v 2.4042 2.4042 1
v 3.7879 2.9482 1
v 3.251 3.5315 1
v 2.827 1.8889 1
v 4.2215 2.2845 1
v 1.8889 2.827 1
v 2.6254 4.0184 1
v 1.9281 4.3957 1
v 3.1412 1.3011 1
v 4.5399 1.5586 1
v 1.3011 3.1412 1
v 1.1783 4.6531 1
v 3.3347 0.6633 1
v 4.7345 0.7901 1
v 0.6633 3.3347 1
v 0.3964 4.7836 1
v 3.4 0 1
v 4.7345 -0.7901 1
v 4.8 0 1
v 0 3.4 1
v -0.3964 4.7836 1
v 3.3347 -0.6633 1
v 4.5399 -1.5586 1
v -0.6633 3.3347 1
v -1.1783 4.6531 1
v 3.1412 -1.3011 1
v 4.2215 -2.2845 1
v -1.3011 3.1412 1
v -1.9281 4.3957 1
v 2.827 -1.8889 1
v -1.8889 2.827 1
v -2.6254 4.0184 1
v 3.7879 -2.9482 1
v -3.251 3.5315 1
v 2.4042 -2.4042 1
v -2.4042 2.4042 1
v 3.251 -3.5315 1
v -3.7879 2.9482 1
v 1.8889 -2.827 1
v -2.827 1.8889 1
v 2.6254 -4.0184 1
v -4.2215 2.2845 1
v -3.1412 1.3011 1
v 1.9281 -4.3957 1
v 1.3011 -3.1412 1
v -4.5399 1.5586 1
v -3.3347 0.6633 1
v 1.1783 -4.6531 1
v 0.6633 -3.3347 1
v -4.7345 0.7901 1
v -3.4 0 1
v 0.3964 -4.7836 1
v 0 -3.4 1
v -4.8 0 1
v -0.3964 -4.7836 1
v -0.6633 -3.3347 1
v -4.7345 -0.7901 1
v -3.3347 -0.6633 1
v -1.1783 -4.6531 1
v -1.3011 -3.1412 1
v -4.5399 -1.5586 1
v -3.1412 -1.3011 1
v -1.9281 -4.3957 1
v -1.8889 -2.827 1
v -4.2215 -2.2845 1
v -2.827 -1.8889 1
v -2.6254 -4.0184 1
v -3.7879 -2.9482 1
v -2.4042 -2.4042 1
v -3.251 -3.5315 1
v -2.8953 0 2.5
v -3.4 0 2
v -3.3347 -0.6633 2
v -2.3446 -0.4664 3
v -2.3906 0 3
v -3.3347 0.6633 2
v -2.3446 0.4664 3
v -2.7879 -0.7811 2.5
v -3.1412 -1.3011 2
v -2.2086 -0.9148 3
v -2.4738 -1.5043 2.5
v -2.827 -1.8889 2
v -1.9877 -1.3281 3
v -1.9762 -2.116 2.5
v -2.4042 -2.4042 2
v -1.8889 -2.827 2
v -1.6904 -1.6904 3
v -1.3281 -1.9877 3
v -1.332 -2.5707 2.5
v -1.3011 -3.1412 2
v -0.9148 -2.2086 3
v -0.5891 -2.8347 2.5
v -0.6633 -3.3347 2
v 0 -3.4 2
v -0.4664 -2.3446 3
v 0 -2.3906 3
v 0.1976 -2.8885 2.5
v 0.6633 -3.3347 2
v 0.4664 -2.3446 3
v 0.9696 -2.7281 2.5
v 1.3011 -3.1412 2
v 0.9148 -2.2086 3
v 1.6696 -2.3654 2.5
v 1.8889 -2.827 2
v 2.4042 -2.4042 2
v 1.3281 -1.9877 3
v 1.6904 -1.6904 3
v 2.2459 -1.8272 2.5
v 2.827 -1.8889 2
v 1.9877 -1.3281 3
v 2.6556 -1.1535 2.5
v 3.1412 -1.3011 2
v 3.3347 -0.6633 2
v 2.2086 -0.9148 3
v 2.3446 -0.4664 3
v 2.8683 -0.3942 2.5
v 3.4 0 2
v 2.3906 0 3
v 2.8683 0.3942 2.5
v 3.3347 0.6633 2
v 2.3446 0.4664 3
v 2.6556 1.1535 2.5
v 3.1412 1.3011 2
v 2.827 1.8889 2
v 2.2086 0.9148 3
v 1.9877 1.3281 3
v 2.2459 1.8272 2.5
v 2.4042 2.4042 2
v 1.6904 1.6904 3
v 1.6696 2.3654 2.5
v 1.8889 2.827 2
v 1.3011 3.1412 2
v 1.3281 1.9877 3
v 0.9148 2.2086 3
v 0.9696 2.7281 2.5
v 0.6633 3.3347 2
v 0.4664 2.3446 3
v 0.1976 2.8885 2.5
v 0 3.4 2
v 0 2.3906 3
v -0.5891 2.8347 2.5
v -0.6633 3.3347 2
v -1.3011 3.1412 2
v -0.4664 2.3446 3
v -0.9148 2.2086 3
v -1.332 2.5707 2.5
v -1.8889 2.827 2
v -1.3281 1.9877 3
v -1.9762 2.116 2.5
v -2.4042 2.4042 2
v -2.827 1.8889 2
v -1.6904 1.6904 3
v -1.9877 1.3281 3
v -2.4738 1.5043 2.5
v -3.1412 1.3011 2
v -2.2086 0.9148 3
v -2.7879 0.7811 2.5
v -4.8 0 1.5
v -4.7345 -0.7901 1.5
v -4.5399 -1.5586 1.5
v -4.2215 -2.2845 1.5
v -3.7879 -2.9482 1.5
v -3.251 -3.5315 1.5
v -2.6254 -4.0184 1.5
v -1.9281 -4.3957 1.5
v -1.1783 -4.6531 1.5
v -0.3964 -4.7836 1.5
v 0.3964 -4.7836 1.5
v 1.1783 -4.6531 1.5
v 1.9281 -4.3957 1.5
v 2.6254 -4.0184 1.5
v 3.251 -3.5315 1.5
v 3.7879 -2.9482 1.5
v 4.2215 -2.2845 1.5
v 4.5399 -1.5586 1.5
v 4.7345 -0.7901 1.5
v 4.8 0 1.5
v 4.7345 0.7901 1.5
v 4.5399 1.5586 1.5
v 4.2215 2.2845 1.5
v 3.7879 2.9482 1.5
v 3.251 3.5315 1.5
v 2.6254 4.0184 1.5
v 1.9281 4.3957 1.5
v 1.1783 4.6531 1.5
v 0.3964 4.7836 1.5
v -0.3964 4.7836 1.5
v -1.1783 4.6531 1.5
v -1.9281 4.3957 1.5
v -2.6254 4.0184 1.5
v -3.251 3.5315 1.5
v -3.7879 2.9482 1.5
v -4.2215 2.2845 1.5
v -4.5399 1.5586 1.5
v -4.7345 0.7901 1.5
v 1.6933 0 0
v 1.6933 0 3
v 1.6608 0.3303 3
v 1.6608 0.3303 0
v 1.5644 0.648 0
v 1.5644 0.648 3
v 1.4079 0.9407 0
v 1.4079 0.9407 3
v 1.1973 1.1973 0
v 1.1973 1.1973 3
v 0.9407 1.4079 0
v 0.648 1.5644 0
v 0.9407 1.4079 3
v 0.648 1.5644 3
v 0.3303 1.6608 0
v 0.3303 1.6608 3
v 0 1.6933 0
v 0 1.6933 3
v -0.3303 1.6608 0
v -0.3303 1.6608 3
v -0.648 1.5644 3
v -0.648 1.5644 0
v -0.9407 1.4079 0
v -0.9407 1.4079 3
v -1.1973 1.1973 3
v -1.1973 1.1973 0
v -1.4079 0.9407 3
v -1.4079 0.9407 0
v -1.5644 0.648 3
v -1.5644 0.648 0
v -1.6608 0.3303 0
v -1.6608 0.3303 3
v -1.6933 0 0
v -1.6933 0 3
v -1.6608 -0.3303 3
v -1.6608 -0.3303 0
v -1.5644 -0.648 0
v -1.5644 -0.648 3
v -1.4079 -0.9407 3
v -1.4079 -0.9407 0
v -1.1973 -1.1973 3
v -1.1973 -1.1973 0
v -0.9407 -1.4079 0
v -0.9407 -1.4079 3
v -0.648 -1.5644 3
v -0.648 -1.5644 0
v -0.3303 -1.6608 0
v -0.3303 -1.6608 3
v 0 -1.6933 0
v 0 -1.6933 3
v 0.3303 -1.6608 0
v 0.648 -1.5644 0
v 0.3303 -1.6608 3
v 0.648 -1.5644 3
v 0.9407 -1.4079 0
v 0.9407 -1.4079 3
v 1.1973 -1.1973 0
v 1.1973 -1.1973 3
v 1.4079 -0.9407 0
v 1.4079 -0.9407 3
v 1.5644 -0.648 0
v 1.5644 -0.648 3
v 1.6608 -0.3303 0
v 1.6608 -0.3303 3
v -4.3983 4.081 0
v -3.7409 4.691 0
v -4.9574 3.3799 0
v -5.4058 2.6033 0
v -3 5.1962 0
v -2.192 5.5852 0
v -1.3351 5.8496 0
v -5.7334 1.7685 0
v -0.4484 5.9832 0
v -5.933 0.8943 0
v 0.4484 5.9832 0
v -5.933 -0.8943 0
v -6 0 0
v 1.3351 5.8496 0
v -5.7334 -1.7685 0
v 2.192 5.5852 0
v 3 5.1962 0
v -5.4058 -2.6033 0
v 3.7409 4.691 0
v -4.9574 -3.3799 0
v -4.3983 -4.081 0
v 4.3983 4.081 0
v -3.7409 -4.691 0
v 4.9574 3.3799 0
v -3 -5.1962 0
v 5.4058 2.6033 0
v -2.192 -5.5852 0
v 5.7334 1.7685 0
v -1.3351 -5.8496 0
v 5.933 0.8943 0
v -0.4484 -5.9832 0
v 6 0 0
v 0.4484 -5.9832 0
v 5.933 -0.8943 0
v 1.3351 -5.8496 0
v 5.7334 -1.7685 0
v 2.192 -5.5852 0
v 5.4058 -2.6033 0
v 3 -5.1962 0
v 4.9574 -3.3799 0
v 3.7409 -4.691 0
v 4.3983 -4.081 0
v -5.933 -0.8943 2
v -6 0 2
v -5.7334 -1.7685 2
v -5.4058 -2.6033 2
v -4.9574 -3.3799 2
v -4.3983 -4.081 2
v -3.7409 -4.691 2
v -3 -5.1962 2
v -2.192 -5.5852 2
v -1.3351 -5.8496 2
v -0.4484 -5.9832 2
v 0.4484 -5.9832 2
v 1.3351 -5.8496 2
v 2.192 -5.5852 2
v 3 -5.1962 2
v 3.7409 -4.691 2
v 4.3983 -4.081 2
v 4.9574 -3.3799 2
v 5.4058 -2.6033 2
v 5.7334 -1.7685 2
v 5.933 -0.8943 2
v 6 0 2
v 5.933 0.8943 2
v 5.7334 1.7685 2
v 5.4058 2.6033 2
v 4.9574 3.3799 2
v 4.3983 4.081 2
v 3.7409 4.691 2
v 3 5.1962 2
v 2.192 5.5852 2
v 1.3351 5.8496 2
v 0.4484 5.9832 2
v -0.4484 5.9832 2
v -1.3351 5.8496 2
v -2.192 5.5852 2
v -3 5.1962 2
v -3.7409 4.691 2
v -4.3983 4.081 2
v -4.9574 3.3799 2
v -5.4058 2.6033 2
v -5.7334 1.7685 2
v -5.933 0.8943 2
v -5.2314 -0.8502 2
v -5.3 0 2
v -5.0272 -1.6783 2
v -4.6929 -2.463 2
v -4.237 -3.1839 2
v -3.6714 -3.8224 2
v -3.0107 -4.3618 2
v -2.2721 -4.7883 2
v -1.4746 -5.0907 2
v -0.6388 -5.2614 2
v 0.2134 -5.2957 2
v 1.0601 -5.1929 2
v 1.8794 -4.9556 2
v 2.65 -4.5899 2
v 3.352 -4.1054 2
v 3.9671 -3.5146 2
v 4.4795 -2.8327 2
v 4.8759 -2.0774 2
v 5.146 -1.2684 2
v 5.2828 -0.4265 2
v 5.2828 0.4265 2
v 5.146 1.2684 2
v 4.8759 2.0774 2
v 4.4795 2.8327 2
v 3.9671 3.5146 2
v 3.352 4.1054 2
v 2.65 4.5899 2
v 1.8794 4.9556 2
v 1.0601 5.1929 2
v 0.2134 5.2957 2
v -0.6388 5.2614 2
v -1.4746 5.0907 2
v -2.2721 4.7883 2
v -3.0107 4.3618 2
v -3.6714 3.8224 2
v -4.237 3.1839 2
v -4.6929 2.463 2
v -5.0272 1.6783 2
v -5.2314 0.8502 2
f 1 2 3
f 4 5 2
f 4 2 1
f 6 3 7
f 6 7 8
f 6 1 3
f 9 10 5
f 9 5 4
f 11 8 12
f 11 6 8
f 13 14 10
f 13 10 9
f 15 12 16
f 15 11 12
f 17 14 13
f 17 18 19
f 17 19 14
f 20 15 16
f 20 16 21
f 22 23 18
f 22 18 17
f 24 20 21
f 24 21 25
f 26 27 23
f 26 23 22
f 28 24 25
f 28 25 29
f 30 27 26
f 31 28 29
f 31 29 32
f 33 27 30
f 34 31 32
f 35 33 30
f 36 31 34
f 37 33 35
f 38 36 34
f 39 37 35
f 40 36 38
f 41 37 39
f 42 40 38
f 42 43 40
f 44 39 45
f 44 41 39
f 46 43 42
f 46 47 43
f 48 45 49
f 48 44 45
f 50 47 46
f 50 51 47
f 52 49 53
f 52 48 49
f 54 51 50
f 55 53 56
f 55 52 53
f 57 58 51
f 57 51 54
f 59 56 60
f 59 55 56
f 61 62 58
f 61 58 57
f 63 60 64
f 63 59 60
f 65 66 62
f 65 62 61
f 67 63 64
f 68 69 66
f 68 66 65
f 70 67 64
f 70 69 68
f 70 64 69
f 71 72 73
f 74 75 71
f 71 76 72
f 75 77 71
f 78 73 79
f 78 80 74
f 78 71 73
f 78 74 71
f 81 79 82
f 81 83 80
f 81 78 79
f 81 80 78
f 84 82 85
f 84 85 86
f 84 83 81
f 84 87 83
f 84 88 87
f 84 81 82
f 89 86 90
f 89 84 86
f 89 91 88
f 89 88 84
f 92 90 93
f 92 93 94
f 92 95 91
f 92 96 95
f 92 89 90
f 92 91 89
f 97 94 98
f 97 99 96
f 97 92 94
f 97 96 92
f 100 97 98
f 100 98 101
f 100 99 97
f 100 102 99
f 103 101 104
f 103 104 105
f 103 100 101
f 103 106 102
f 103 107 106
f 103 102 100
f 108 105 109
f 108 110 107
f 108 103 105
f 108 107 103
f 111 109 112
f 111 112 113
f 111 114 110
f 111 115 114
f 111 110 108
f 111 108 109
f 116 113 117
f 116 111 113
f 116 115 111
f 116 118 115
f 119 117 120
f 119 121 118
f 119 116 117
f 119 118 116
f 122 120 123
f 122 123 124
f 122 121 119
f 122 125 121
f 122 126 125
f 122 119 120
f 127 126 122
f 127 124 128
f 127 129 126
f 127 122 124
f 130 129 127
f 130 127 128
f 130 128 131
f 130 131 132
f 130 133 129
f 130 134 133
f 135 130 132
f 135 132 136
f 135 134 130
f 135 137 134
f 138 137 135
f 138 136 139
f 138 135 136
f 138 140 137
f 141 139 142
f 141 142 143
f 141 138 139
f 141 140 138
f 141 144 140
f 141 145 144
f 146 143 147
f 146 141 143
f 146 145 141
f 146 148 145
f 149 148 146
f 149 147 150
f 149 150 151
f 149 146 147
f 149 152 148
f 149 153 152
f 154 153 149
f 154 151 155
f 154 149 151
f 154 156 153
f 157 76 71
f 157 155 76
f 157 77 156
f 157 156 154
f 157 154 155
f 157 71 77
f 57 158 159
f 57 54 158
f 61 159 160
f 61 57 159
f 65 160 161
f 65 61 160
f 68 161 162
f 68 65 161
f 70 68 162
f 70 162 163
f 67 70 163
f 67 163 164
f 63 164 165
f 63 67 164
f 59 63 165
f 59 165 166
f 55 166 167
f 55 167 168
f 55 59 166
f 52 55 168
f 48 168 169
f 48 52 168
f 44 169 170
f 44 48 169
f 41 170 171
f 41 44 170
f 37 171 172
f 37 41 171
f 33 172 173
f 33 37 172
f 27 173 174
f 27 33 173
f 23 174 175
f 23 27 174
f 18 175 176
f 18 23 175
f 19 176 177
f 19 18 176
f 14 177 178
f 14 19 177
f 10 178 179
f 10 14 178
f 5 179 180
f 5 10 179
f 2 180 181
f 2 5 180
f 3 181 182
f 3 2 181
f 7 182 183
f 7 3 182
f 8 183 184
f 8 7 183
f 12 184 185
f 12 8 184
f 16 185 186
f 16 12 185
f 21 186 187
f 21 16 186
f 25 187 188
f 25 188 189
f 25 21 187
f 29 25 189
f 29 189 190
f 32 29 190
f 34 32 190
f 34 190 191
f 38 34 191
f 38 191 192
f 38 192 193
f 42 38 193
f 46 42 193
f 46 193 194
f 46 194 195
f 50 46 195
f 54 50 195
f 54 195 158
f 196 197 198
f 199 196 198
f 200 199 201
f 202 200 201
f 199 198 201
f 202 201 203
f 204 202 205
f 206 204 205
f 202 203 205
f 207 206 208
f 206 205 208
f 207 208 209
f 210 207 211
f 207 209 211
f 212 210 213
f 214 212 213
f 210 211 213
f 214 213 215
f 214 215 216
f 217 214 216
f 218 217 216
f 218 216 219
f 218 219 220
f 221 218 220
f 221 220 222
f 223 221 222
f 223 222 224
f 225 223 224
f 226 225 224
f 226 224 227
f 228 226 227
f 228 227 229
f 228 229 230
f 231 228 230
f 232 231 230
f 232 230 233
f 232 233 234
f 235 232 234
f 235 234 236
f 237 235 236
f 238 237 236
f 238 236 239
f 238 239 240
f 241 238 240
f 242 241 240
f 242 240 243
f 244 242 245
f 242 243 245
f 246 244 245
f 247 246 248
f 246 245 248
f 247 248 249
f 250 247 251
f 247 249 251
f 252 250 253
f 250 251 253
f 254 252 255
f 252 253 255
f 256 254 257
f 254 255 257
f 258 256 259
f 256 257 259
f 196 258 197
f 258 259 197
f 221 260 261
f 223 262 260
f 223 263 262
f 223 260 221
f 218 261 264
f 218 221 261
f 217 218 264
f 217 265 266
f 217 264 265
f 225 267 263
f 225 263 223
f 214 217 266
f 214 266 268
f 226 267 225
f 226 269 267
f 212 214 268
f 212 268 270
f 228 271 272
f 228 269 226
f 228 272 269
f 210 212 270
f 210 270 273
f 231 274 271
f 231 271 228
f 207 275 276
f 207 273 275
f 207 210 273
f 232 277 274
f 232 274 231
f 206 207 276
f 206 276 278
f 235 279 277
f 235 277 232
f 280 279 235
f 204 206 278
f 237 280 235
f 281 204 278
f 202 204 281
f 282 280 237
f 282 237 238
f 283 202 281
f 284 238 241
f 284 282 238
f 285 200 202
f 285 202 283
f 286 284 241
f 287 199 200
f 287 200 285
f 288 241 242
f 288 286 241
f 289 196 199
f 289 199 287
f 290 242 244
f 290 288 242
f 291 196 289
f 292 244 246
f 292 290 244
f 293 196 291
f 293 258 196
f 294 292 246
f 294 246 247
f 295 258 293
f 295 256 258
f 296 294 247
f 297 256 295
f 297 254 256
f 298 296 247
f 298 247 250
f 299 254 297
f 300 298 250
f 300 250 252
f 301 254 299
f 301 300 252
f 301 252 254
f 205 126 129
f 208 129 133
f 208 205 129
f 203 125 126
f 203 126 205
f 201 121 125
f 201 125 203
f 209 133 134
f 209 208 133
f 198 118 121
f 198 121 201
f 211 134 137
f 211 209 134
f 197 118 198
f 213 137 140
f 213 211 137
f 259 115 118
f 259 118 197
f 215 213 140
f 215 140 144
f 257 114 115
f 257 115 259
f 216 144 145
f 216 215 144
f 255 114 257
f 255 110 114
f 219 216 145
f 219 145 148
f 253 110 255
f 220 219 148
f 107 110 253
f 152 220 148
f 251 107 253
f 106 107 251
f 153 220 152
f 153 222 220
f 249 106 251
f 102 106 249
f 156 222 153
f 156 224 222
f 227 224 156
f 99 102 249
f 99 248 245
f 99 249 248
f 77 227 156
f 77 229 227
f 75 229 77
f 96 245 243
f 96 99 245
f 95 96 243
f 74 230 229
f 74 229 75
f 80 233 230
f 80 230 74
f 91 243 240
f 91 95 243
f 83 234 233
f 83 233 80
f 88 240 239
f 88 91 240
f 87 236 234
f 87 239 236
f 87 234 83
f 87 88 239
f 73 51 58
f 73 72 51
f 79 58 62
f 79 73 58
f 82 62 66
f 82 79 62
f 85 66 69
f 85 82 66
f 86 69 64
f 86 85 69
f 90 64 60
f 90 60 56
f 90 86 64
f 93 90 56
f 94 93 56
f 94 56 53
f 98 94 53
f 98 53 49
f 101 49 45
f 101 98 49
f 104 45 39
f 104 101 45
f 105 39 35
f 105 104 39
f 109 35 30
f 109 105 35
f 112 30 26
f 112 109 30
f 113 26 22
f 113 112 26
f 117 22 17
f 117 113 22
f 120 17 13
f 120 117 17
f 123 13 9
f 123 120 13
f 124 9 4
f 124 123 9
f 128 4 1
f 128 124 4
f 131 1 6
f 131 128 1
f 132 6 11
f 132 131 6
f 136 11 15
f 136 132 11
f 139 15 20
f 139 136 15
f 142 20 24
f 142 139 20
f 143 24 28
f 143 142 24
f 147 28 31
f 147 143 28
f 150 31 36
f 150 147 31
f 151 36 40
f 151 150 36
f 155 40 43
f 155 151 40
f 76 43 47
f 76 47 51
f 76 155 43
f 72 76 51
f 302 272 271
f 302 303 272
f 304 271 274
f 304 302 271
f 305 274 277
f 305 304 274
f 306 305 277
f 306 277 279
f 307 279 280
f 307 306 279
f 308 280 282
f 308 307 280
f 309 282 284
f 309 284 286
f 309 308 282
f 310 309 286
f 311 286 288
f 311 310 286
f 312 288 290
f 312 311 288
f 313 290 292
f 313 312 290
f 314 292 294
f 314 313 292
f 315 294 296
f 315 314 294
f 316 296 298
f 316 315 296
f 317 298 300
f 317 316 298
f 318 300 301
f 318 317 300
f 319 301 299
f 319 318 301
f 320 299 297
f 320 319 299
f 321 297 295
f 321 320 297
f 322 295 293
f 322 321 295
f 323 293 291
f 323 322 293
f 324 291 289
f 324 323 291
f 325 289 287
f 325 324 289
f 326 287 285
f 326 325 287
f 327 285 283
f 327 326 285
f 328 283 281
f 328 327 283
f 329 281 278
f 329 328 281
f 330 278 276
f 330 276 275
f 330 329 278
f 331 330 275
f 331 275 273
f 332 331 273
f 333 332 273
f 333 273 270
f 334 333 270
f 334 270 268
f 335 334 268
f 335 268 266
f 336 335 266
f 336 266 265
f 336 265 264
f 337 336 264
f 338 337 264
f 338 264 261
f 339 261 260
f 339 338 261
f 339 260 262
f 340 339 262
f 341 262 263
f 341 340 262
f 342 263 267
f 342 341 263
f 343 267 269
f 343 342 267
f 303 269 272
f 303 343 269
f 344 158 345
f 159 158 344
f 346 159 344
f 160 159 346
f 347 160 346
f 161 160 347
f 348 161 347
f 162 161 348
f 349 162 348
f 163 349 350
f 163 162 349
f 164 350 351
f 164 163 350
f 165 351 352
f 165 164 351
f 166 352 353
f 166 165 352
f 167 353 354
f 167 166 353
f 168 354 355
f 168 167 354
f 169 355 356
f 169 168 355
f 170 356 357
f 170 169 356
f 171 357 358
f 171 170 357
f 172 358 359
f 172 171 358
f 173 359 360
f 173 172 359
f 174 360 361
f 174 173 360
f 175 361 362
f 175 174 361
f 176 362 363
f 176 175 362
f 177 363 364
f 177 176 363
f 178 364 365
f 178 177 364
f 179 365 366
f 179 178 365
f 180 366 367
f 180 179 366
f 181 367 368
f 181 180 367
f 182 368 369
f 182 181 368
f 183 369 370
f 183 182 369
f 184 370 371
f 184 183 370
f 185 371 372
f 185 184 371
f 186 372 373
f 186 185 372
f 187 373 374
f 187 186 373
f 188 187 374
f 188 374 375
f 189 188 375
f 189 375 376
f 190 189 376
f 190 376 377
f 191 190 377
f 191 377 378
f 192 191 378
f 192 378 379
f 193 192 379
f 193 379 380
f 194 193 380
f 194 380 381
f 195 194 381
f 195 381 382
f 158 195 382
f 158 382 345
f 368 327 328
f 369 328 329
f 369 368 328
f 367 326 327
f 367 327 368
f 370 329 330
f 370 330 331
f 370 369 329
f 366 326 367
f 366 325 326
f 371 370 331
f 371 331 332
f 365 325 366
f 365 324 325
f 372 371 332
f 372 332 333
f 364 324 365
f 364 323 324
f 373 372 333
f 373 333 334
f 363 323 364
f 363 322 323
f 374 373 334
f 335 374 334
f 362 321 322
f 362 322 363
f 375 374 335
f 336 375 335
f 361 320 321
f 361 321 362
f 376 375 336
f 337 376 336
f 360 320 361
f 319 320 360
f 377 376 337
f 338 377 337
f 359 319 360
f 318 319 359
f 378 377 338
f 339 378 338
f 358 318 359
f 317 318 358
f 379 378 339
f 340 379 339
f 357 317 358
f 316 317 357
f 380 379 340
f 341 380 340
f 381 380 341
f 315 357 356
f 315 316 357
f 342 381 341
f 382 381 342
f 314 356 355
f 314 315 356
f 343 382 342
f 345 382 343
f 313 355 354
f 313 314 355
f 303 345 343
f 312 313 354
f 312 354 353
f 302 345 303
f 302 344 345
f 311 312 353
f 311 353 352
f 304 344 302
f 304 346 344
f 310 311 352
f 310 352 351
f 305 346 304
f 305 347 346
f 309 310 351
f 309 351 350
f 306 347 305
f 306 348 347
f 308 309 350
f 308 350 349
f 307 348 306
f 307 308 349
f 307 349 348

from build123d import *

# Parameters (mm, degrees)
SKETCH2_R          = 1.6933
CUT_EXTRUDE1_DEPTH = 10


with BuildPart() as part:
    # Sketch1 → Revolve1 (revolve)
    with BuildSketch(Plane(origin=(0, 0, 0), x_dir=(1, 0, 0), z_dir=(0, 1, 0)), mode=Mode.PRIVATE) as revolve1_sk:
        Polygon((0, 0), (6, 0), (6, -2), (5.3, -2), (4.8, -1.5), (4.8, -1), (3.4, -1), (3.4, -2), (2.39055, -3), (0, -3), align=None)
    revolve(revolve1_sk.sketch.rotate(Axis((0, 0, 0), (0, 0, 1)), 180), axis=Axis((0, 0, 0), (0, 0, 1)))

    # Sketch2 → Cut-Extrude1 (cut, through all)
    with BuildSketch(Plane.XY.offset(3)):
        Circle(SKETCH2_R)
    extrude(amount=-CUT_EXTRUDE1_DEPTH, mode=Mode.SUBTRACT)


solid = part.part
